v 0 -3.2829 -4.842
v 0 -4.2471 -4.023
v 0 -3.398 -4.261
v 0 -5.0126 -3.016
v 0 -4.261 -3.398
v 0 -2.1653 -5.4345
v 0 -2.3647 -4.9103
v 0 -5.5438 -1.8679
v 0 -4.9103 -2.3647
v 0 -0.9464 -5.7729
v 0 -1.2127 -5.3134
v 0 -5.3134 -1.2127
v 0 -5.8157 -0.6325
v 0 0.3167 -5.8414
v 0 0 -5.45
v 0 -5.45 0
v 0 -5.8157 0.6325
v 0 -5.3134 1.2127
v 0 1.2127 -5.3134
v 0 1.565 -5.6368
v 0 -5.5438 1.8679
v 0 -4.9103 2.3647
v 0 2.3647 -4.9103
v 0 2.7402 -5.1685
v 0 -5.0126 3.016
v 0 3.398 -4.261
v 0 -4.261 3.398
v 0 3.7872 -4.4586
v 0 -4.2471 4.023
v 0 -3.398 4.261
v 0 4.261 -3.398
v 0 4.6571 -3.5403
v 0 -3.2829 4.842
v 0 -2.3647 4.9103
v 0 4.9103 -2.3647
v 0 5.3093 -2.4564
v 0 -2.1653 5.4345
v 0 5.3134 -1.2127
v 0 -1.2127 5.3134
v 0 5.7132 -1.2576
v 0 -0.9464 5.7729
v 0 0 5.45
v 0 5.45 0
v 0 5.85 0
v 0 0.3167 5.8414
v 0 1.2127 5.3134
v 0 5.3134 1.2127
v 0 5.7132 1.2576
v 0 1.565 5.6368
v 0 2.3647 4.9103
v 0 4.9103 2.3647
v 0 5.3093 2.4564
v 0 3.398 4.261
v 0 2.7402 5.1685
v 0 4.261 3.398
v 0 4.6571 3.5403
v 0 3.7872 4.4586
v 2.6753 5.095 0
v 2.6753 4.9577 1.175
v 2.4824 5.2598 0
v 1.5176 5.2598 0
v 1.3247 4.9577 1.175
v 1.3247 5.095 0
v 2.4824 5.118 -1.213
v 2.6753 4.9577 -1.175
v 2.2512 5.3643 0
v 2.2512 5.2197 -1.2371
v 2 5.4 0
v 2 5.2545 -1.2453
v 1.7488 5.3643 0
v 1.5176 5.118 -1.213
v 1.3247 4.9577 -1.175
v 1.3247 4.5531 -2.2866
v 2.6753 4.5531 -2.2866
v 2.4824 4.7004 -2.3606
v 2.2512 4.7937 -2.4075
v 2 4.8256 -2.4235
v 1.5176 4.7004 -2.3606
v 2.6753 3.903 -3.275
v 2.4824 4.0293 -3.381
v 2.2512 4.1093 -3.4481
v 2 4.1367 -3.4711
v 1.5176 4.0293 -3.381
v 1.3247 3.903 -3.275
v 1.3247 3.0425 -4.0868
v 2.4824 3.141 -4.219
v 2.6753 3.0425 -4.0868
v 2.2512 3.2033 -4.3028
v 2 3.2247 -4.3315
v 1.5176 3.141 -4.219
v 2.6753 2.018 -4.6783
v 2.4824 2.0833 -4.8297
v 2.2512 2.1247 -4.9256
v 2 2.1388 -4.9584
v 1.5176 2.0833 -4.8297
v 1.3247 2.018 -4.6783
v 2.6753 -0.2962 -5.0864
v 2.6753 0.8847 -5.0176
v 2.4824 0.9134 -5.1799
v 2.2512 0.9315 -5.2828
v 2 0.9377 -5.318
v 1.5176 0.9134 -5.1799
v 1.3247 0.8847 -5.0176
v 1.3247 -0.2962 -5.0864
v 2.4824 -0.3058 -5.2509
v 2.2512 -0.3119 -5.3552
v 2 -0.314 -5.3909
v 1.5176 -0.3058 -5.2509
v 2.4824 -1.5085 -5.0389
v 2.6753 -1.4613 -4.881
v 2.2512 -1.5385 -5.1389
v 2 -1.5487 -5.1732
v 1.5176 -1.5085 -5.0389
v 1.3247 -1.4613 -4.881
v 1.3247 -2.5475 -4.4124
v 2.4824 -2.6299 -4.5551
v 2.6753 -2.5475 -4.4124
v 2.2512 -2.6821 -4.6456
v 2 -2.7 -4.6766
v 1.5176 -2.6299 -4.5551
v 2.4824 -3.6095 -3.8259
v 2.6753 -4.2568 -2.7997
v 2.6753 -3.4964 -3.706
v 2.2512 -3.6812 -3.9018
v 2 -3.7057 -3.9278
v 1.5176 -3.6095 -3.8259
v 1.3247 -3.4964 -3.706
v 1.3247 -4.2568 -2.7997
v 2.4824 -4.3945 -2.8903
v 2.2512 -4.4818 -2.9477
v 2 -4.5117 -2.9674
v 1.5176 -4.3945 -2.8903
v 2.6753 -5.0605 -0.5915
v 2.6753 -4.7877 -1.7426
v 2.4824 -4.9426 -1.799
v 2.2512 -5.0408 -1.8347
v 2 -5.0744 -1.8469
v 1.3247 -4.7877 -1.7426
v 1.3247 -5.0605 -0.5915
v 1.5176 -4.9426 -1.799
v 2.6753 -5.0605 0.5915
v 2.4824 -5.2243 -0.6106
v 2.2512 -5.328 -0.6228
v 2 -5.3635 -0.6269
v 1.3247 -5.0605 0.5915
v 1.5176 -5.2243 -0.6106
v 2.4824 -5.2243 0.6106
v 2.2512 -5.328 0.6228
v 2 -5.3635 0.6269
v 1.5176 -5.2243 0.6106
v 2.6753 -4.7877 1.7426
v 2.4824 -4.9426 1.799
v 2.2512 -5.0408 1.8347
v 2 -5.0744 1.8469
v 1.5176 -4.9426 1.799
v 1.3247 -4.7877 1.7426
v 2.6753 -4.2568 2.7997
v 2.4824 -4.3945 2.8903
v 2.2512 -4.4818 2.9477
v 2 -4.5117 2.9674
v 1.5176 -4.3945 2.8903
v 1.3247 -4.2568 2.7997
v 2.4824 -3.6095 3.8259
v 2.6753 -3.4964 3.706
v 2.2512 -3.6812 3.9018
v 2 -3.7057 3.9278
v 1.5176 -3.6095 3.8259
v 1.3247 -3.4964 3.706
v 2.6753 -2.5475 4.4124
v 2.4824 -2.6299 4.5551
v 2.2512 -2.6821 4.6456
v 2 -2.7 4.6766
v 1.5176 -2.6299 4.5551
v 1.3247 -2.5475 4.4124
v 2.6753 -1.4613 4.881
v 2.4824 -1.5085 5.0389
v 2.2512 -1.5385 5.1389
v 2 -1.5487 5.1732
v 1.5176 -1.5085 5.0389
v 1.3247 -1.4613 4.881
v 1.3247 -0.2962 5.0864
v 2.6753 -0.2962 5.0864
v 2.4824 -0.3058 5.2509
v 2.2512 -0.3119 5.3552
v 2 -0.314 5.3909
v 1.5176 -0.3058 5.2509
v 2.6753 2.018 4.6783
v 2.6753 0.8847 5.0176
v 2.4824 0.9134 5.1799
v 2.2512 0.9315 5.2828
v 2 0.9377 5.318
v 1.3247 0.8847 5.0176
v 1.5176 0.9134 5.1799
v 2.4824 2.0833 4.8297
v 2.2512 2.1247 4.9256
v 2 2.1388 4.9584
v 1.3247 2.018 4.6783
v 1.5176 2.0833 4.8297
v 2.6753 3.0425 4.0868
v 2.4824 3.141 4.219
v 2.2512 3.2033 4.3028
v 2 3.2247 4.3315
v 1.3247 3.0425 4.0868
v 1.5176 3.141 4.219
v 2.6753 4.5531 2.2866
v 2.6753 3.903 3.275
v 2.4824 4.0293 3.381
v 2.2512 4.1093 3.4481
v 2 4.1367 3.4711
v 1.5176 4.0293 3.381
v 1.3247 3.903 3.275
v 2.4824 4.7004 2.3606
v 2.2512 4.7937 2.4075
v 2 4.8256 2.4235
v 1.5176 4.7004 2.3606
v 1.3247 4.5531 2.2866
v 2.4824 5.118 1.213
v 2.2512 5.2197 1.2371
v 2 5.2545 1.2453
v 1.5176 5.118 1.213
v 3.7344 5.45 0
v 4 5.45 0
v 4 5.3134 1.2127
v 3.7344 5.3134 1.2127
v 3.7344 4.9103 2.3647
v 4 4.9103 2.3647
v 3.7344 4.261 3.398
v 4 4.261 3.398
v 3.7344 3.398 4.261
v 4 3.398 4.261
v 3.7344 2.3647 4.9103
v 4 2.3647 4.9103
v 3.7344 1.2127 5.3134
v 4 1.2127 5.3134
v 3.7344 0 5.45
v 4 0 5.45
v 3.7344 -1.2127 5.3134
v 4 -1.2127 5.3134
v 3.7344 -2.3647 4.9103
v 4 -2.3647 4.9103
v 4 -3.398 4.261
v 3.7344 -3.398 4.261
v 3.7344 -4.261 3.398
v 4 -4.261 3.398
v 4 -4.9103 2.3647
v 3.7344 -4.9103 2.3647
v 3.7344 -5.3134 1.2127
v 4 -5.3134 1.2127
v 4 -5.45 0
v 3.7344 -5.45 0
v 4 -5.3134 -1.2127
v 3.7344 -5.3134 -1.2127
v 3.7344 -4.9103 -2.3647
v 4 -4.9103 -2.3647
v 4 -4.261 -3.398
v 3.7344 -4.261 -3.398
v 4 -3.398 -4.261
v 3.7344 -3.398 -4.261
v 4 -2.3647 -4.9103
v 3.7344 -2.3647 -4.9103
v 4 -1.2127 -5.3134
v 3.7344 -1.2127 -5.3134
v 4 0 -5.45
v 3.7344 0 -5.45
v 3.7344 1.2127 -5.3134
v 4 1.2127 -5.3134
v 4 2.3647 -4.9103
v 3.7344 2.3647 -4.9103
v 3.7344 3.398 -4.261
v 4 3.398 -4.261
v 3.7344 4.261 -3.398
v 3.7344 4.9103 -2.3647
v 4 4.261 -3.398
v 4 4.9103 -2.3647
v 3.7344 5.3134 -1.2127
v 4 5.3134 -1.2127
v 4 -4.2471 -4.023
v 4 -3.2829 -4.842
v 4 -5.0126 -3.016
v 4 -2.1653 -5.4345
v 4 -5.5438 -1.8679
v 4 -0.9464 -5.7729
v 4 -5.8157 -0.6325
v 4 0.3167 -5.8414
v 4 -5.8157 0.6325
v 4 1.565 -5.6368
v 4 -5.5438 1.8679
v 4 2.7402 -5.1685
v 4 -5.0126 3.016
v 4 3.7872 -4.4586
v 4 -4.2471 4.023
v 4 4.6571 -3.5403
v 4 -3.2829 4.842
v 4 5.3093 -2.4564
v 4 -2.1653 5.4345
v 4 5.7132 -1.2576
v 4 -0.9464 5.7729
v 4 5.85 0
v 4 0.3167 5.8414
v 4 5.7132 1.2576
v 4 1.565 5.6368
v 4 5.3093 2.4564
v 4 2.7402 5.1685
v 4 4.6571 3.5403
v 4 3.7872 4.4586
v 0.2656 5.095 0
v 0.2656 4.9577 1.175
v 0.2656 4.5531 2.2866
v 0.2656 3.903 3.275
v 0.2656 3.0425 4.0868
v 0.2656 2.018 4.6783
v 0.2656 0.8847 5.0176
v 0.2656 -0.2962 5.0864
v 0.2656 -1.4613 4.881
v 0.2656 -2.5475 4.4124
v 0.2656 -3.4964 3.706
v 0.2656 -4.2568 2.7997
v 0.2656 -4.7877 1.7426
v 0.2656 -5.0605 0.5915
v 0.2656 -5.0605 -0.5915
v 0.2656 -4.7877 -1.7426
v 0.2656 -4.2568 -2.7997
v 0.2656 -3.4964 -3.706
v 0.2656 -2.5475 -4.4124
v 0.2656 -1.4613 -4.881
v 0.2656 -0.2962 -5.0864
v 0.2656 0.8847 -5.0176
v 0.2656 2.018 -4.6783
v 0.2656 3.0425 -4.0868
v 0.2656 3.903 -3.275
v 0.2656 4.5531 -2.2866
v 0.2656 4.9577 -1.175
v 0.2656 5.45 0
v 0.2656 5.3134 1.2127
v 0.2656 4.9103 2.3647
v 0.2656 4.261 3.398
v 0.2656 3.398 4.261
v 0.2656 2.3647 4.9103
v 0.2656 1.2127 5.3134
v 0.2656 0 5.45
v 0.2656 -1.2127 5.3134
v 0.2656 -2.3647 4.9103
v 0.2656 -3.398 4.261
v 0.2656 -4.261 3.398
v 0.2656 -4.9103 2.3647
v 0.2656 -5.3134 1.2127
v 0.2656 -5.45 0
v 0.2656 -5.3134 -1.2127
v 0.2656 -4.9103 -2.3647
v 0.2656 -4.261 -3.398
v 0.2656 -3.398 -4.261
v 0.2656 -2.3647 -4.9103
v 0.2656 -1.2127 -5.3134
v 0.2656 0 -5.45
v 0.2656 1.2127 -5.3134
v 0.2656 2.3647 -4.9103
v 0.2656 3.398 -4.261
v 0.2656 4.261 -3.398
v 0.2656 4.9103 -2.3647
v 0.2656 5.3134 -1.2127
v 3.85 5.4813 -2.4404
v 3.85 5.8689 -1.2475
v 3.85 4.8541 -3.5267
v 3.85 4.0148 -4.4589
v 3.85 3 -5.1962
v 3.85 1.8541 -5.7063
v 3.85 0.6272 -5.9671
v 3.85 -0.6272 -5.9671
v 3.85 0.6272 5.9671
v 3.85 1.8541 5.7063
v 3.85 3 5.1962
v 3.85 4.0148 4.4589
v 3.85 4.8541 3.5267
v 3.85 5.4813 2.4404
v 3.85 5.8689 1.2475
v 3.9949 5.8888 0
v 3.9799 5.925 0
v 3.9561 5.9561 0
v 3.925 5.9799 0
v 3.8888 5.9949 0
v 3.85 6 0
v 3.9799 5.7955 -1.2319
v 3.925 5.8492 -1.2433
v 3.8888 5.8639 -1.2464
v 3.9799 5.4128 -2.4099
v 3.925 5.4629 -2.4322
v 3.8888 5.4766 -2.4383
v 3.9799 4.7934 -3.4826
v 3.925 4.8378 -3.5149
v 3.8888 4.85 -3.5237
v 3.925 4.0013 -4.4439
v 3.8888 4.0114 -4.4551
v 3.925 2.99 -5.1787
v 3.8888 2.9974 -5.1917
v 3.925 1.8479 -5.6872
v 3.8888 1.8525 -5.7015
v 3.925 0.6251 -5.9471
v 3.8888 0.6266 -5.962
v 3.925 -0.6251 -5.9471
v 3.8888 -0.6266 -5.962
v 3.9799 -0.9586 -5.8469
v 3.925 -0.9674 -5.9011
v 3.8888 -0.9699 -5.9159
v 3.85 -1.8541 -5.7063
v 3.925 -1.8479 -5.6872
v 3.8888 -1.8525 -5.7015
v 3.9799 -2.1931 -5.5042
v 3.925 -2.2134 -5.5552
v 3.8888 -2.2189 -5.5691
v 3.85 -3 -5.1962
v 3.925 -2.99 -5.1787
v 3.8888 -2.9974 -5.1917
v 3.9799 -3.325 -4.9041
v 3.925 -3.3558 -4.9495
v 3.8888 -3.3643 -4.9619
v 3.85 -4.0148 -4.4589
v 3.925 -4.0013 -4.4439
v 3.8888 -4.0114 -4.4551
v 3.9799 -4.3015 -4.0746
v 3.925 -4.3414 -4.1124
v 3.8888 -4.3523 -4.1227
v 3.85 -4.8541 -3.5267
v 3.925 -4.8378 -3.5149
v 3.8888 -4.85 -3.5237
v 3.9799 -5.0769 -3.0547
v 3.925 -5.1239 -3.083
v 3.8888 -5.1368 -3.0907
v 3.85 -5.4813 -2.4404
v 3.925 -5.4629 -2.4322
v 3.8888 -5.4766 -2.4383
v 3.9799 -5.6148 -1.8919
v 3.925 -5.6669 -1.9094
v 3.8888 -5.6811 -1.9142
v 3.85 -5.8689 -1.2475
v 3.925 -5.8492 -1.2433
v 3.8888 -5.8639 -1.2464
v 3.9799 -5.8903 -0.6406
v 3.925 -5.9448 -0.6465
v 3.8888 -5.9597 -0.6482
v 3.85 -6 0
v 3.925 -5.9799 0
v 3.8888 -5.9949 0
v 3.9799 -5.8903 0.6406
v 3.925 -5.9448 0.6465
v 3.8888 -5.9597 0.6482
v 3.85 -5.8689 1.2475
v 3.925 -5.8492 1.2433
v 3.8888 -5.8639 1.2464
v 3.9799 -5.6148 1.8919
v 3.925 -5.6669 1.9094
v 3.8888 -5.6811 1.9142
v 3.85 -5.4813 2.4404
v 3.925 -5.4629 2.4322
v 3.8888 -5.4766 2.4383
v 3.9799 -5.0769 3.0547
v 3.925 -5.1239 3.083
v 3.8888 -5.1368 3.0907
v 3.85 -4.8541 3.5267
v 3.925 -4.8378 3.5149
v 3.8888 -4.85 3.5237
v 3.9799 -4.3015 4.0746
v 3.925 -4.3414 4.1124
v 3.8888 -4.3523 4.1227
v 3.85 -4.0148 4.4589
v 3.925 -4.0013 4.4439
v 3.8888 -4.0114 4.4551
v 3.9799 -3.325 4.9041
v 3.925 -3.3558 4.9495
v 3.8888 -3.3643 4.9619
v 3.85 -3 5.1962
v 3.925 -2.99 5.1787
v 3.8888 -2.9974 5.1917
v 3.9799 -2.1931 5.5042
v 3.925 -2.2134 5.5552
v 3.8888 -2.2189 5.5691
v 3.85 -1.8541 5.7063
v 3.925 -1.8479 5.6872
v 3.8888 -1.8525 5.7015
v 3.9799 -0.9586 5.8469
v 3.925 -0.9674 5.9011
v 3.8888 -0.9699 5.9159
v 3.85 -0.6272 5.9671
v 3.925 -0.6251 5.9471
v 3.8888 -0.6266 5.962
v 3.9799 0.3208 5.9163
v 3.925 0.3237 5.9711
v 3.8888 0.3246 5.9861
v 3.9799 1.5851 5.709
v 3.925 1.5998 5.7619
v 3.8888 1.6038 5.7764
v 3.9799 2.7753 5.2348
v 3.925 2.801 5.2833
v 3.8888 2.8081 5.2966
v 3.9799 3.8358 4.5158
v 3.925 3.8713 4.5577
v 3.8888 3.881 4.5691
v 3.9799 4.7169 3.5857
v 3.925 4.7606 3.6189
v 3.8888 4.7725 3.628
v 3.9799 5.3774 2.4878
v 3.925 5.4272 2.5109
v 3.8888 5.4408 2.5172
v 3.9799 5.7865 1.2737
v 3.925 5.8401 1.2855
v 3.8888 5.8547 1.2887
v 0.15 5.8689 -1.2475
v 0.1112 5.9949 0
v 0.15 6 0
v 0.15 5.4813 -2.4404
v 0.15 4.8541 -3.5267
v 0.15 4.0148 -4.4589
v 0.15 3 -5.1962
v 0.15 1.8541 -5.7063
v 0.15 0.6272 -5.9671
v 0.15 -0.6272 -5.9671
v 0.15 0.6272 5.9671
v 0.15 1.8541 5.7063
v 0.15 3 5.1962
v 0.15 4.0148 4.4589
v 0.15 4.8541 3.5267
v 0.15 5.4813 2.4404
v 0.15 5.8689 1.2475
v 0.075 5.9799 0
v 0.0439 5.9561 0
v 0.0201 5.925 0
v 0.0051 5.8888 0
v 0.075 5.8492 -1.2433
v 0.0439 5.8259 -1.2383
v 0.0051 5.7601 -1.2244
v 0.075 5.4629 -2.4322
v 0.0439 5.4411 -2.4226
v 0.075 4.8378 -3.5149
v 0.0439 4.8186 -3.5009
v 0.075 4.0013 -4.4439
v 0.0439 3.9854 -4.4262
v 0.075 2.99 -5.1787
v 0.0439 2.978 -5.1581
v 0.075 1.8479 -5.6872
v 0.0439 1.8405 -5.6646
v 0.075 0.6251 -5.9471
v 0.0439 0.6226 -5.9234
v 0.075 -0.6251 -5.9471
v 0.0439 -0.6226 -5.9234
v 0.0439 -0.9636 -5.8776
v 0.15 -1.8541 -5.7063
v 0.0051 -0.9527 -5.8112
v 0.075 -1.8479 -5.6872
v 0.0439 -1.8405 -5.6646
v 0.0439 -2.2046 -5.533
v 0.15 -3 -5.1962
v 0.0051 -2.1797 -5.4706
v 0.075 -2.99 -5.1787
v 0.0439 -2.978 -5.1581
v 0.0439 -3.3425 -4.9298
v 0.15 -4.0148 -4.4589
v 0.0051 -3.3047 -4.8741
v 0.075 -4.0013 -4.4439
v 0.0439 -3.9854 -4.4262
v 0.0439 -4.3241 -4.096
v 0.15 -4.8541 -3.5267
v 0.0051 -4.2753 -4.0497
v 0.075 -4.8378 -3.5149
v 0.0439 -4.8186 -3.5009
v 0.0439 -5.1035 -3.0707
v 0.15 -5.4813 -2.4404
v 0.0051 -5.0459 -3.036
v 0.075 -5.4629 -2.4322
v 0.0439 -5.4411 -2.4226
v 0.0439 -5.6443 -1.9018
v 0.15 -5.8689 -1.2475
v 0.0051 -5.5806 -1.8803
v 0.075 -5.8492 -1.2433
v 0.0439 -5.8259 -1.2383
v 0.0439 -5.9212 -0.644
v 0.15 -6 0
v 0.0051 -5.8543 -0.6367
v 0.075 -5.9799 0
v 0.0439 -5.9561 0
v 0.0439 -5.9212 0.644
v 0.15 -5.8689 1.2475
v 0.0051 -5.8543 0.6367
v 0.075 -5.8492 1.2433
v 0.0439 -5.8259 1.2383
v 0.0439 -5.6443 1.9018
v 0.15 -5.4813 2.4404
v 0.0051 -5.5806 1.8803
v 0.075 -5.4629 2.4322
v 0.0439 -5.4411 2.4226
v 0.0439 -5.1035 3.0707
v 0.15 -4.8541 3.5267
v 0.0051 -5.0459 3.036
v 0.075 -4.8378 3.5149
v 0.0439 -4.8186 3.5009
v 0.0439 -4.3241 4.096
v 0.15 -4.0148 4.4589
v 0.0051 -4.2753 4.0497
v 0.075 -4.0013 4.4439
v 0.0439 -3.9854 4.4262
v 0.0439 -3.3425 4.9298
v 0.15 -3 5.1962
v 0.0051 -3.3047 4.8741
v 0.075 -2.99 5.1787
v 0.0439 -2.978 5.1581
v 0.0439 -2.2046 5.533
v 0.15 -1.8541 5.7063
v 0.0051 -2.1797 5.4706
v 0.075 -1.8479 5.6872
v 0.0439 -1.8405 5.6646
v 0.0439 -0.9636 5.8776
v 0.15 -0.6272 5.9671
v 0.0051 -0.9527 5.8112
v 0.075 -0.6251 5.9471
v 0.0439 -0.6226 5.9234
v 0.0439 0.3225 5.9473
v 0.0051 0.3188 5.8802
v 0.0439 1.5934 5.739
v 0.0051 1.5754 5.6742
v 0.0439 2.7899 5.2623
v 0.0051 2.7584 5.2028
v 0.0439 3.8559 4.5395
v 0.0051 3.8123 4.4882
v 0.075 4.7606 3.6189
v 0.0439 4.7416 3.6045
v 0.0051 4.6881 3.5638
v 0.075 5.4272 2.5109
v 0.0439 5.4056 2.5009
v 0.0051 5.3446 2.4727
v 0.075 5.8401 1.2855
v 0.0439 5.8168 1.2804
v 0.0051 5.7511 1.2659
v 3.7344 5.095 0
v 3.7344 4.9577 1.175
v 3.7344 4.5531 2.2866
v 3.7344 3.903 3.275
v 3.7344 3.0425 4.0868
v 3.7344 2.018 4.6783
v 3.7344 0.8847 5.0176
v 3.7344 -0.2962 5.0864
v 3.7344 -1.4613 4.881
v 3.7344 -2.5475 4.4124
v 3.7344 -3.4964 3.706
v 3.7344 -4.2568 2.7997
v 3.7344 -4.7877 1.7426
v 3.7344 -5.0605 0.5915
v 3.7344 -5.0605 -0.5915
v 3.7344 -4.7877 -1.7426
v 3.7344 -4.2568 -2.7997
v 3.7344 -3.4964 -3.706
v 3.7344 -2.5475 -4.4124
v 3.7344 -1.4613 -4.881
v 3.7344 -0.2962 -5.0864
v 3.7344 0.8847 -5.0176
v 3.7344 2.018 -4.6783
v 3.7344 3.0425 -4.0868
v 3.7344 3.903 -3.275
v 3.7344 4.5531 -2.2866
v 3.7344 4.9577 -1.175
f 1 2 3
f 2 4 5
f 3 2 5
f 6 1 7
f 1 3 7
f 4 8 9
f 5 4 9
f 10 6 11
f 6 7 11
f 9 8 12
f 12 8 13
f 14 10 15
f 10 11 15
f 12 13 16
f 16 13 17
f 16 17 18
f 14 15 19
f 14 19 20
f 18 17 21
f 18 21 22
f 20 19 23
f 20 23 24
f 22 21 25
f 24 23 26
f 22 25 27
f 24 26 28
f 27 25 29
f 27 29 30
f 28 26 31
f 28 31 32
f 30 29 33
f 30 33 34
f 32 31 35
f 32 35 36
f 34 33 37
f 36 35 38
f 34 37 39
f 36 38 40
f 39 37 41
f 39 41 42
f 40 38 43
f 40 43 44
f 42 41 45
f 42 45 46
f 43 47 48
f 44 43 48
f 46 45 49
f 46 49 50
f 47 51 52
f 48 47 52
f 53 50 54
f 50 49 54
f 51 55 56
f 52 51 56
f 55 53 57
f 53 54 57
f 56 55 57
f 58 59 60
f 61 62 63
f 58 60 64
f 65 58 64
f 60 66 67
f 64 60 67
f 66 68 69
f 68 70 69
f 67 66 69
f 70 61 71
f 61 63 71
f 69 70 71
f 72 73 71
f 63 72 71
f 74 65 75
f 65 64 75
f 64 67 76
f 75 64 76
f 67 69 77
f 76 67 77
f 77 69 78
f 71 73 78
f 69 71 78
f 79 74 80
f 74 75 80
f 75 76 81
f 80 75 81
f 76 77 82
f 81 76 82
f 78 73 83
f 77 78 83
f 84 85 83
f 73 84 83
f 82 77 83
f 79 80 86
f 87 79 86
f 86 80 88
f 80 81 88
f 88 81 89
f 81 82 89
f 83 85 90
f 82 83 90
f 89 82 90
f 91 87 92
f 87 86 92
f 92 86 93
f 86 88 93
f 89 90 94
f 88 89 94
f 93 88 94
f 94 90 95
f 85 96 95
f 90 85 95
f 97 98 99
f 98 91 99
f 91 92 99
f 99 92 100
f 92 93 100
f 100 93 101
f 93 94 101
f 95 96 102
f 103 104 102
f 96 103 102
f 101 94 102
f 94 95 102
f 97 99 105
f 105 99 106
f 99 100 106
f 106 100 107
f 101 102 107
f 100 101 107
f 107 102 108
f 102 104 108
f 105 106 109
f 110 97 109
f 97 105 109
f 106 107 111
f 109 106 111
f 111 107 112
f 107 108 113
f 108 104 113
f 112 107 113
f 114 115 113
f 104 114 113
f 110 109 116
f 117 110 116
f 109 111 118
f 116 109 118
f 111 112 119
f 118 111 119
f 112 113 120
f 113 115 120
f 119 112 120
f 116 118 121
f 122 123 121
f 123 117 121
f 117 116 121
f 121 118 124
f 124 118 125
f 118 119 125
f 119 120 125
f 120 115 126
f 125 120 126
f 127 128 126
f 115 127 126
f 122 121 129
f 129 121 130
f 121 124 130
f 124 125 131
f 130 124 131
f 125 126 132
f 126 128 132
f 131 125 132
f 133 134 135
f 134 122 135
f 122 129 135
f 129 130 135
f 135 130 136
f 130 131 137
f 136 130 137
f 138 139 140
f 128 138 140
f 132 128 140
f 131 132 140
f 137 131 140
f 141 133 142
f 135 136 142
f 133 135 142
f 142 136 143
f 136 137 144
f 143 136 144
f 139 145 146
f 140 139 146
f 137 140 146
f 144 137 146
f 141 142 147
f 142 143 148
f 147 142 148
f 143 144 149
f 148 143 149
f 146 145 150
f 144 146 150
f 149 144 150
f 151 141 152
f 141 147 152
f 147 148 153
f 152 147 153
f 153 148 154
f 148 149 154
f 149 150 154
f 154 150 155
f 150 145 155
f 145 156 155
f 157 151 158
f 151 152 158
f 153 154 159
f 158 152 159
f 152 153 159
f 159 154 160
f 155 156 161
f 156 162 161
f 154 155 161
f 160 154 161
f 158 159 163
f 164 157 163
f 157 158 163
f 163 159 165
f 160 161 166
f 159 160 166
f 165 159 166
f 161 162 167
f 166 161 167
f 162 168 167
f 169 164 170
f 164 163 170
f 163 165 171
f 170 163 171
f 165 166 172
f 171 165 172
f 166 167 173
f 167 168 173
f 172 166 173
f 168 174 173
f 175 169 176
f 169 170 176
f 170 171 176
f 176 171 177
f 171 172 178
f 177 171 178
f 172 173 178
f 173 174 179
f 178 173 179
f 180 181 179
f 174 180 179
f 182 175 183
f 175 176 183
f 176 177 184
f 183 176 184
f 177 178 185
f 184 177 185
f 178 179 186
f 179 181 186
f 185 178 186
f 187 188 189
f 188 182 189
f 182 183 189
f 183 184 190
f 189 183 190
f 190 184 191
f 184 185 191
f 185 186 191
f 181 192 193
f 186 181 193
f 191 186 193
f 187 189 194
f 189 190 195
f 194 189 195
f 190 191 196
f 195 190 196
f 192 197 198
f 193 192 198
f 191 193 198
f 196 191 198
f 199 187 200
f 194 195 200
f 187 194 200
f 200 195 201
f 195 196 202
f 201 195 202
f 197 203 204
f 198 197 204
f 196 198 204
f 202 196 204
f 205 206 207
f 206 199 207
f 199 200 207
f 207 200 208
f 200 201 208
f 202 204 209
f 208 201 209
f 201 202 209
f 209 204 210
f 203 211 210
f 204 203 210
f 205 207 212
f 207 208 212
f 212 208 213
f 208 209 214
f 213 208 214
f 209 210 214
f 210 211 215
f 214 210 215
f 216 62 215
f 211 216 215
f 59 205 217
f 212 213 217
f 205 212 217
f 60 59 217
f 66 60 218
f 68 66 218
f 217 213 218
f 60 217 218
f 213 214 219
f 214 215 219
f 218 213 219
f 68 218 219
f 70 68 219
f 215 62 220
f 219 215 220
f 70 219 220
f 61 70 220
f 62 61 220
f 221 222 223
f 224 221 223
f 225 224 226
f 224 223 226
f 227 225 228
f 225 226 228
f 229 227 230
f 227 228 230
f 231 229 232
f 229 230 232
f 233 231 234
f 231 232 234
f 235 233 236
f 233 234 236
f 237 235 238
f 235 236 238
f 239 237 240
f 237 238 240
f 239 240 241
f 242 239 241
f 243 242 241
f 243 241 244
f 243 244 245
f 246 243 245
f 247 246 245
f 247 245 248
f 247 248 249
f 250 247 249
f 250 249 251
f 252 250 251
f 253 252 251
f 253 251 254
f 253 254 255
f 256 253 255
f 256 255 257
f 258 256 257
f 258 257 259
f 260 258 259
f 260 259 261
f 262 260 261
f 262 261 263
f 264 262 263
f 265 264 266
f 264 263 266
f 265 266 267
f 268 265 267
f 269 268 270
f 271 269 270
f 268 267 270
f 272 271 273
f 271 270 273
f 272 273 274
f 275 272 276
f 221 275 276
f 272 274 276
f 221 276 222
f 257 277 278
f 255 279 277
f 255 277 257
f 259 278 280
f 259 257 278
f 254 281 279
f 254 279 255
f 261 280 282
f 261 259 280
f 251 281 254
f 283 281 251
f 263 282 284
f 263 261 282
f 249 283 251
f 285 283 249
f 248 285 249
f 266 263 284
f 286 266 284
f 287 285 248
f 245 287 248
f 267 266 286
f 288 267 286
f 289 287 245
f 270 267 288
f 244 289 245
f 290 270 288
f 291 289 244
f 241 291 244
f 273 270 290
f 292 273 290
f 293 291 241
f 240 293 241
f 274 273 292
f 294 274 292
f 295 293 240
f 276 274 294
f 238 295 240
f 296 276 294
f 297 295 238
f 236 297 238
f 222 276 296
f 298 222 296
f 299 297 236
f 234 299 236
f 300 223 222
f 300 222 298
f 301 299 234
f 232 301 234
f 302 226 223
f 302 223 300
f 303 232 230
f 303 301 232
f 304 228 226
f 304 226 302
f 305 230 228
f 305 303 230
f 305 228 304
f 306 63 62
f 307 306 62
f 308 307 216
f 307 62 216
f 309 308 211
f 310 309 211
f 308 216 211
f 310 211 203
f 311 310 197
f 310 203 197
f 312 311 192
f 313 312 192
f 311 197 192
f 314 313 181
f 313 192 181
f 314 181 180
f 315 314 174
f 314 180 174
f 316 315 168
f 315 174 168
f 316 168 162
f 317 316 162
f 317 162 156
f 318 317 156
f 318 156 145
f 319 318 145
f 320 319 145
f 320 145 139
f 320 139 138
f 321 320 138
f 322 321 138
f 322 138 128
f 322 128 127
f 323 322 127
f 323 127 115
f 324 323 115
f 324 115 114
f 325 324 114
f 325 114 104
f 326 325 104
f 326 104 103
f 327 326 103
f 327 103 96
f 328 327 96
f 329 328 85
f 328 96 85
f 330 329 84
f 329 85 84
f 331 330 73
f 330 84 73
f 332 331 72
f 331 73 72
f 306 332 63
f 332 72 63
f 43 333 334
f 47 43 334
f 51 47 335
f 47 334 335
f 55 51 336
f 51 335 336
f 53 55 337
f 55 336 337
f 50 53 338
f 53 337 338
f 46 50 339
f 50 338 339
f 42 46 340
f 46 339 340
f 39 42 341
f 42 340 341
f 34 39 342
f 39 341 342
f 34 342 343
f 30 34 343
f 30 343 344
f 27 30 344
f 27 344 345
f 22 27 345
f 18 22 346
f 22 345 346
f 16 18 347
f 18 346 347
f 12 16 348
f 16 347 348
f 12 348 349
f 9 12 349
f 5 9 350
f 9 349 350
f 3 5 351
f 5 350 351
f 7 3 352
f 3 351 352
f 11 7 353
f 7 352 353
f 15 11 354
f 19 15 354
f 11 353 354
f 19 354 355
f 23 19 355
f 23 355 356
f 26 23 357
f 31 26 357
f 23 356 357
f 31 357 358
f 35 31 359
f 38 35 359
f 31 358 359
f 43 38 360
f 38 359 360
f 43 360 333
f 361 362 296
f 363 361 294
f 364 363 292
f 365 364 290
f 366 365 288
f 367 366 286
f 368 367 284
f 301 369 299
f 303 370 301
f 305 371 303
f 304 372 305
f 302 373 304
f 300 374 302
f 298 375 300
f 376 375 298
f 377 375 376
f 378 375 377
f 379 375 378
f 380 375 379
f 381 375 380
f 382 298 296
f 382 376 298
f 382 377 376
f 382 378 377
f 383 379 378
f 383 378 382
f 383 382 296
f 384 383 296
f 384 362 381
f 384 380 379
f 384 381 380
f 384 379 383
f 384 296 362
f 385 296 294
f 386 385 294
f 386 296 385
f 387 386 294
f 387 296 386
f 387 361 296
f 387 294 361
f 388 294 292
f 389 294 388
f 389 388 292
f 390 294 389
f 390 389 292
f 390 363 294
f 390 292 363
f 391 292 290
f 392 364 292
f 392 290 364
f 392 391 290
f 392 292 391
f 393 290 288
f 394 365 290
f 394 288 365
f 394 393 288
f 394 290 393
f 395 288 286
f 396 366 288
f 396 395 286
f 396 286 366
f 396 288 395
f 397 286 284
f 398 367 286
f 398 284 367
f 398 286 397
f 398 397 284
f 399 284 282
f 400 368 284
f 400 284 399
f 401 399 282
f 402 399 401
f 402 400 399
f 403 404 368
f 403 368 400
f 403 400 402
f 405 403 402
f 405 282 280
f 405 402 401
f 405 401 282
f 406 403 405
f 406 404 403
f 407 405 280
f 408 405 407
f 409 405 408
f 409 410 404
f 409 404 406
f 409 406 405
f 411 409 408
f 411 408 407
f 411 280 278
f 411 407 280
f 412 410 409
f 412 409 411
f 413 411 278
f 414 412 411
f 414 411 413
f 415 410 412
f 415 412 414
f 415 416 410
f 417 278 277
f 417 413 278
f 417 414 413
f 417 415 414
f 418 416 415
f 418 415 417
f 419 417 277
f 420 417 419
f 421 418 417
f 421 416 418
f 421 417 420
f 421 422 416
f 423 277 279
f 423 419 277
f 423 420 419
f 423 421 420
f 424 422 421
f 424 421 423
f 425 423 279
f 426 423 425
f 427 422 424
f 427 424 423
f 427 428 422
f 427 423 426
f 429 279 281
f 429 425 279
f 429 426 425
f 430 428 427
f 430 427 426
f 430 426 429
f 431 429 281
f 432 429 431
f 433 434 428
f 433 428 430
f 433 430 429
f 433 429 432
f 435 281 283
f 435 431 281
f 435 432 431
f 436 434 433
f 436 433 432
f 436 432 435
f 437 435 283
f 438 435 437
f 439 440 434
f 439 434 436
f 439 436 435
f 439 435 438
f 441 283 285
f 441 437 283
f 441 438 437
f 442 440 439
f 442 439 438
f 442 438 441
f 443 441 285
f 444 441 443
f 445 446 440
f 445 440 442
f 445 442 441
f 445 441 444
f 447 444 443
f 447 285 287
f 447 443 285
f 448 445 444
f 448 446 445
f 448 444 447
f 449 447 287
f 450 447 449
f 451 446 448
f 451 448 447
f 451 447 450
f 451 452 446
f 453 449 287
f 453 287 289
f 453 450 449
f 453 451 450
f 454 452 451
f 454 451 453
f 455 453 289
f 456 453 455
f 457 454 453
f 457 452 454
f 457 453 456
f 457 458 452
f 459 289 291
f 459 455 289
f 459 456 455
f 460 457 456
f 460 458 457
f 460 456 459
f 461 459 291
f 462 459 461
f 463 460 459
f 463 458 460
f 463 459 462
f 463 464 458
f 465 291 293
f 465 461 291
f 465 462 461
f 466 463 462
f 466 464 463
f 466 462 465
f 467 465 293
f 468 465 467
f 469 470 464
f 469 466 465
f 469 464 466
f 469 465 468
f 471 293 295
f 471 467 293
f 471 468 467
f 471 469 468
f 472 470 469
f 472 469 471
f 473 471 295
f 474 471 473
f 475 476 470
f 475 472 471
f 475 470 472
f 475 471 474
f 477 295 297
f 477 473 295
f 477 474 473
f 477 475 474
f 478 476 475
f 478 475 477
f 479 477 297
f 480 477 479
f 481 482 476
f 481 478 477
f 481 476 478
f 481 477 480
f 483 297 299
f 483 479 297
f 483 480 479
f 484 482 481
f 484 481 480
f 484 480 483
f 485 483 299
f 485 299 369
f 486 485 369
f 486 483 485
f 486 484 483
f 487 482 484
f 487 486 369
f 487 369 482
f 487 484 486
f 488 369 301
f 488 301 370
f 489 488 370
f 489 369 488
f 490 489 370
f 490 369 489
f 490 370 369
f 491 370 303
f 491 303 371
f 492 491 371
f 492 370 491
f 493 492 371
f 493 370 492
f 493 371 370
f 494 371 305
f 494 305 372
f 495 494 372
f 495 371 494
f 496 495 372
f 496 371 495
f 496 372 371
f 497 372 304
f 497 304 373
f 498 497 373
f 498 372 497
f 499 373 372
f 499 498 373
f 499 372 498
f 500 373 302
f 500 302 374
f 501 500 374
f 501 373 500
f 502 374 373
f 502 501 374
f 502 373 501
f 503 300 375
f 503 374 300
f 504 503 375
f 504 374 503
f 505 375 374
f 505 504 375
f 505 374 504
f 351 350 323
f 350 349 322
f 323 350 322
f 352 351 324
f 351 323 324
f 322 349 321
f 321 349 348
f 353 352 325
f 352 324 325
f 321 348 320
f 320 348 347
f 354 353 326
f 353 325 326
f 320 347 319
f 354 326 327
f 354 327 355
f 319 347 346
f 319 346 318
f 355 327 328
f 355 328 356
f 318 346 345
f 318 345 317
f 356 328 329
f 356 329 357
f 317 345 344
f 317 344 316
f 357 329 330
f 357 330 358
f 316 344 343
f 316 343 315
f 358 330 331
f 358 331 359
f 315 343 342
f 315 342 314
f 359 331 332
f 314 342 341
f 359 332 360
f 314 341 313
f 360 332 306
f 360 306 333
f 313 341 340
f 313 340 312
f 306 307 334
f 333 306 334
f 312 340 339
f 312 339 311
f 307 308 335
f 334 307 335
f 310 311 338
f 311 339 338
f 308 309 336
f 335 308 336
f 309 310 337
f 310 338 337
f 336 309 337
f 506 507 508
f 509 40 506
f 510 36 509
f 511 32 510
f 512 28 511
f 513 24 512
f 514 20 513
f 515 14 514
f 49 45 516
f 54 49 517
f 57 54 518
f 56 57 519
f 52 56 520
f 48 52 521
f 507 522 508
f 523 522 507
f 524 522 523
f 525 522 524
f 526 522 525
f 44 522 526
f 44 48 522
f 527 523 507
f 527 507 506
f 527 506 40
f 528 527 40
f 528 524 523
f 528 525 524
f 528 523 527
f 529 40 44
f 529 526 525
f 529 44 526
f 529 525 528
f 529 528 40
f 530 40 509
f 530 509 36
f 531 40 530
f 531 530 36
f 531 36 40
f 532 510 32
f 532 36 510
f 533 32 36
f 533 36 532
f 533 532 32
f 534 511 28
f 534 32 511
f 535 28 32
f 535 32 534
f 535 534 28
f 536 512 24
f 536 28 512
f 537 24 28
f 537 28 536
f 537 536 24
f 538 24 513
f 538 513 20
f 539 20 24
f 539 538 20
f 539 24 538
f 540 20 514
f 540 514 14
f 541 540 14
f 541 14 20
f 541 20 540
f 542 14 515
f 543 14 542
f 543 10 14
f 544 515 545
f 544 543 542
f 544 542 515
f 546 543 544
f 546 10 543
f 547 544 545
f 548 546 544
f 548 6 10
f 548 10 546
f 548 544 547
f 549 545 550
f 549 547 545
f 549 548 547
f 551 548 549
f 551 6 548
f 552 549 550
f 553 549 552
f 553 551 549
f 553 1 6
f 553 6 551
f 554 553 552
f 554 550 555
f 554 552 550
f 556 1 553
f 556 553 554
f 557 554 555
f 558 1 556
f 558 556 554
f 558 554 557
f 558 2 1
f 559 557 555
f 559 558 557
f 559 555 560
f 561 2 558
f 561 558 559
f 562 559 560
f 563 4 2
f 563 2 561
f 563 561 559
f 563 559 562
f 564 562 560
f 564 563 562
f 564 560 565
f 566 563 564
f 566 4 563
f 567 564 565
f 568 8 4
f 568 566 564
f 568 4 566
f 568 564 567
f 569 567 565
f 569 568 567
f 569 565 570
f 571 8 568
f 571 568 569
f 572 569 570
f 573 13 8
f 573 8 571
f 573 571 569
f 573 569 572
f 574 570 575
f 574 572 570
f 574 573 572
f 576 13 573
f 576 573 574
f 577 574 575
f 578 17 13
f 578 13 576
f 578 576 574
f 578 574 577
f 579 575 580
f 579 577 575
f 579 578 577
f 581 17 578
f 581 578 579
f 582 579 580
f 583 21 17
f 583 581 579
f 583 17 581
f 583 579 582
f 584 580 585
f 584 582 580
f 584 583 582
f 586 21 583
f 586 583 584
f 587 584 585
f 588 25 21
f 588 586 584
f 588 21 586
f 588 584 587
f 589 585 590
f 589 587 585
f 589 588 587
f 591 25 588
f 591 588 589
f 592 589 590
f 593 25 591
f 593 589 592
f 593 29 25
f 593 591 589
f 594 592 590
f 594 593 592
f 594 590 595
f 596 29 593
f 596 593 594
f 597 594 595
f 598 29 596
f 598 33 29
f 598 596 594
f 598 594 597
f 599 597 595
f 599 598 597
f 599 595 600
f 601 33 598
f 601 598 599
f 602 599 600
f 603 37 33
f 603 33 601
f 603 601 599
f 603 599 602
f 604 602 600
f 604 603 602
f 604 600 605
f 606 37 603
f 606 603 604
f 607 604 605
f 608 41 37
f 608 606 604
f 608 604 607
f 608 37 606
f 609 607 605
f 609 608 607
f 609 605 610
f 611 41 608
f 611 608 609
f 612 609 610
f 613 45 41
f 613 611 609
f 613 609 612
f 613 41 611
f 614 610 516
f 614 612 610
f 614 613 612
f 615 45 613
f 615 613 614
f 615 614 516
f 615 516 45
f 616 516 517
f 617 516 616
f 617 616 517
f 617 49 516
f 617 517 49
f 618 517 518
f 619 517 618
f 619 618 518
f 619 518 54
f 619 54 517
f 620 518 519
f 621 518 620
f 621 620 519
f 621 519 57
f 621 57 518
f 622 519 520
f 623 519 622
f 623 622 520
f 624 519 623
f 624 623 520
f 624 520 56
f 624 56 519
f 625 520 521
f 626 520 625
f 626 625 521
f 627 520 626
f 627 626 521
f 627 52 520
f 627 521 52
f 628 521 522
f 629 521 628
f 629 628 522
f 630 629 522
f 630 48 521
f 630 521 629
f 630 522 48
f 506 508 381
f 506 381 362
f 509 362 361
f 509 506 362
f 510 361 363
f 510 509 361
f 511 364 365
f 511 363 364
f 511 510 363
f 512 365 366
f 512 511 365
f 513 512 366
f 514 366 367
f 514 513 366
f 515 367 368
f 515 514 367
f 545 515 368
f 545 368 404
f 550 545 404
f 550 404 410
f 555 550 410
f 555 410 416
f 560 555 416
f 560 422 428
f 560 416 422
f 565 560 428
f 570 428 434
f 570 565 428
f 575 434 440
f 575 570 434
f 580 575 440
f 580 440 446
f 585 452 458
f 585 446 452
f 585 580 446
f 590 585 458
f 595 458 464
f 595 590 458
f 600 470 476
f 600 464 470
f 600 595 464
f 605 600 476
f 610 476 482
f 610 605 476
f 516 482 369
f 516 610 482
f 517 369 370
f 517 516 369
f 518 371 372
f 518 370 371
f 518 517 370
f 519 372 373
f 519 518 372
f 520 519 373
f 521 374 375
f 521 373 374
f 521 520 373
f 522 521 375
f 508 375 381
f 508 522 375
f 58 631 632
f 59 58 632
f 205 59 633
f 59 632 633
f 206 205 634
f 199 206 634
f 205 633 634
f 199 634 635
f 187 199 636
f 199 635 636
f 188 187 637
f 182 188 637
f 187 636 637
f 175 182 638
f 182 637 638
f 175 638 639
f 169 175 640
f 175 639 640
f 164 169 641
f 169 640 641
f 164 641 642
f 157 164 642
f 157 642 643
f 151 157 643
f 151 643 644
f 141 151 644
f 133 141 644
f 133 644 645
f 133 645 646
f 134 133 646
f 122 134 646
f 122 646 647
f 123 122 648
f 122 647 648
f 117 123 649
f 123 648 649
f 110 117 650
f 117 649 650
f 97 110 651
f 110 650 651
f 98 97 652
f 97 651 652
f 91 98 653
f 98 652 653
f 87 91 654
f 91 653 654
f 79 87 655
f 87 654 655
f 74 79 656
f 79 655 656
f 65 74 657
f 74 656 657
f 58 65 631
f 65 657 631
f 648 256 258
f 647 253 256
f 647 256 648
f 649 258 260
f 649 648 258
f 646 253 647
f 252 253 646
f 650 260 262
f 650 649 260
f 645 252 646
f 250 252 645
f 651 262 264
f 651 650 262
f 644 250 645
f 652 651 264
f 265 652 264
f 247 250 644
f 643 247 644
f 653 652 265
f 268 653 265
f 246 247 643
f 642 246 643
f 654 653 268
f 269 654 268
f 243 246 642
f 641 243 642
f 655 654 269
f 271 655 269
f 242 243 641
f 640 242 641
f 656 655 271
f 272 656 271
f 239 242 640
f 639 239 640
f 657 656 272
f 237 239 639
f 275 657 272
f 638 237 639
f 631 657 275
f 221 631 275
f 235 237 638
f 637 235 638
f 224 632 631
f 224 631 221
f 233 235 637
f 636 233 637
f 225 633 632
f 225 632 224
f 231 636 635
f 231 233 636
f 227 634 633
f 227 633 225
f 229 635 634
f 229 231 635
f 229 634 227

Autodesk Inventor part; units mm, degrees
sketch "Sketch_1" plane through (0, 0, 0) normal (0, 0, 1) x (1, 0, 0)
  line L0 (4, 0) -> (0, 0)
  line L1 (0, 5.45) -> (0.2656, 5.45)
  line L2 (0.2656, 5.45) -> (0.2656, 5.095)
  line L3 (0.2656, 5.095) -> (1.3247, 5.095)
  arc A0 (2.6753, 5.095) -> (1.3247, 5.095) centre (2, 4.5) ccw
  line L4 (2.6753, 5.095) -> (3.7344, 5.095)
  line L5 (3.7344, 5.095) -> (3.7344, 5.45)
  line L6 (3.7344, 5.45) -> (4, 5.45)
  line L7 (4, 5.45) -> (4, 5.85)
  arc A1 (4, 5.85) -> (3.85, 6) centre (3.85, 5.85) ccw
  line L8 (3.85, 6) -> (0.15, 6)
  arc A2 (0.15, 6) -> (0, 5.85) centre (0.15, 5.85) ccw
  line L9 (0, 5.85) -> (0, 5.45)
revolve "Revolution1" add sketch "Sketch_1" angle 360 about axis through (4, 0, 0) along (1, 0, 0)
ref_plane "ip_st_or_1_XY" through (0, 0, 0) normal (1, 0, 0) x (0, 0, -1)
ref_plane "ip_st_or_1_YZ" through (0, 0, 0) normal (0, 0, -1) x (0, 1, 0)
ref_plane "ip_st_or_1_ZX" through (0, 0, 0) normal (0, 1, 0) x (1, 0, 0)
ref_plane "ip_st_or_2_XY" through (3.7344, 0, 0) normal (-1, 0, 0) x (0, 0, -1)
ref_plane "ip_st_or_2_YZ" through (3.7344, 0, 0) normal (0, 0, -1) x (0, -1, 0)
ref_plane "ip_st_or_2_ZX" through (3.7344, 0, 0) normal (0, -1, 0) x (-1, 0, 0)
properties part number "MR126ZZ Outer Ring"
